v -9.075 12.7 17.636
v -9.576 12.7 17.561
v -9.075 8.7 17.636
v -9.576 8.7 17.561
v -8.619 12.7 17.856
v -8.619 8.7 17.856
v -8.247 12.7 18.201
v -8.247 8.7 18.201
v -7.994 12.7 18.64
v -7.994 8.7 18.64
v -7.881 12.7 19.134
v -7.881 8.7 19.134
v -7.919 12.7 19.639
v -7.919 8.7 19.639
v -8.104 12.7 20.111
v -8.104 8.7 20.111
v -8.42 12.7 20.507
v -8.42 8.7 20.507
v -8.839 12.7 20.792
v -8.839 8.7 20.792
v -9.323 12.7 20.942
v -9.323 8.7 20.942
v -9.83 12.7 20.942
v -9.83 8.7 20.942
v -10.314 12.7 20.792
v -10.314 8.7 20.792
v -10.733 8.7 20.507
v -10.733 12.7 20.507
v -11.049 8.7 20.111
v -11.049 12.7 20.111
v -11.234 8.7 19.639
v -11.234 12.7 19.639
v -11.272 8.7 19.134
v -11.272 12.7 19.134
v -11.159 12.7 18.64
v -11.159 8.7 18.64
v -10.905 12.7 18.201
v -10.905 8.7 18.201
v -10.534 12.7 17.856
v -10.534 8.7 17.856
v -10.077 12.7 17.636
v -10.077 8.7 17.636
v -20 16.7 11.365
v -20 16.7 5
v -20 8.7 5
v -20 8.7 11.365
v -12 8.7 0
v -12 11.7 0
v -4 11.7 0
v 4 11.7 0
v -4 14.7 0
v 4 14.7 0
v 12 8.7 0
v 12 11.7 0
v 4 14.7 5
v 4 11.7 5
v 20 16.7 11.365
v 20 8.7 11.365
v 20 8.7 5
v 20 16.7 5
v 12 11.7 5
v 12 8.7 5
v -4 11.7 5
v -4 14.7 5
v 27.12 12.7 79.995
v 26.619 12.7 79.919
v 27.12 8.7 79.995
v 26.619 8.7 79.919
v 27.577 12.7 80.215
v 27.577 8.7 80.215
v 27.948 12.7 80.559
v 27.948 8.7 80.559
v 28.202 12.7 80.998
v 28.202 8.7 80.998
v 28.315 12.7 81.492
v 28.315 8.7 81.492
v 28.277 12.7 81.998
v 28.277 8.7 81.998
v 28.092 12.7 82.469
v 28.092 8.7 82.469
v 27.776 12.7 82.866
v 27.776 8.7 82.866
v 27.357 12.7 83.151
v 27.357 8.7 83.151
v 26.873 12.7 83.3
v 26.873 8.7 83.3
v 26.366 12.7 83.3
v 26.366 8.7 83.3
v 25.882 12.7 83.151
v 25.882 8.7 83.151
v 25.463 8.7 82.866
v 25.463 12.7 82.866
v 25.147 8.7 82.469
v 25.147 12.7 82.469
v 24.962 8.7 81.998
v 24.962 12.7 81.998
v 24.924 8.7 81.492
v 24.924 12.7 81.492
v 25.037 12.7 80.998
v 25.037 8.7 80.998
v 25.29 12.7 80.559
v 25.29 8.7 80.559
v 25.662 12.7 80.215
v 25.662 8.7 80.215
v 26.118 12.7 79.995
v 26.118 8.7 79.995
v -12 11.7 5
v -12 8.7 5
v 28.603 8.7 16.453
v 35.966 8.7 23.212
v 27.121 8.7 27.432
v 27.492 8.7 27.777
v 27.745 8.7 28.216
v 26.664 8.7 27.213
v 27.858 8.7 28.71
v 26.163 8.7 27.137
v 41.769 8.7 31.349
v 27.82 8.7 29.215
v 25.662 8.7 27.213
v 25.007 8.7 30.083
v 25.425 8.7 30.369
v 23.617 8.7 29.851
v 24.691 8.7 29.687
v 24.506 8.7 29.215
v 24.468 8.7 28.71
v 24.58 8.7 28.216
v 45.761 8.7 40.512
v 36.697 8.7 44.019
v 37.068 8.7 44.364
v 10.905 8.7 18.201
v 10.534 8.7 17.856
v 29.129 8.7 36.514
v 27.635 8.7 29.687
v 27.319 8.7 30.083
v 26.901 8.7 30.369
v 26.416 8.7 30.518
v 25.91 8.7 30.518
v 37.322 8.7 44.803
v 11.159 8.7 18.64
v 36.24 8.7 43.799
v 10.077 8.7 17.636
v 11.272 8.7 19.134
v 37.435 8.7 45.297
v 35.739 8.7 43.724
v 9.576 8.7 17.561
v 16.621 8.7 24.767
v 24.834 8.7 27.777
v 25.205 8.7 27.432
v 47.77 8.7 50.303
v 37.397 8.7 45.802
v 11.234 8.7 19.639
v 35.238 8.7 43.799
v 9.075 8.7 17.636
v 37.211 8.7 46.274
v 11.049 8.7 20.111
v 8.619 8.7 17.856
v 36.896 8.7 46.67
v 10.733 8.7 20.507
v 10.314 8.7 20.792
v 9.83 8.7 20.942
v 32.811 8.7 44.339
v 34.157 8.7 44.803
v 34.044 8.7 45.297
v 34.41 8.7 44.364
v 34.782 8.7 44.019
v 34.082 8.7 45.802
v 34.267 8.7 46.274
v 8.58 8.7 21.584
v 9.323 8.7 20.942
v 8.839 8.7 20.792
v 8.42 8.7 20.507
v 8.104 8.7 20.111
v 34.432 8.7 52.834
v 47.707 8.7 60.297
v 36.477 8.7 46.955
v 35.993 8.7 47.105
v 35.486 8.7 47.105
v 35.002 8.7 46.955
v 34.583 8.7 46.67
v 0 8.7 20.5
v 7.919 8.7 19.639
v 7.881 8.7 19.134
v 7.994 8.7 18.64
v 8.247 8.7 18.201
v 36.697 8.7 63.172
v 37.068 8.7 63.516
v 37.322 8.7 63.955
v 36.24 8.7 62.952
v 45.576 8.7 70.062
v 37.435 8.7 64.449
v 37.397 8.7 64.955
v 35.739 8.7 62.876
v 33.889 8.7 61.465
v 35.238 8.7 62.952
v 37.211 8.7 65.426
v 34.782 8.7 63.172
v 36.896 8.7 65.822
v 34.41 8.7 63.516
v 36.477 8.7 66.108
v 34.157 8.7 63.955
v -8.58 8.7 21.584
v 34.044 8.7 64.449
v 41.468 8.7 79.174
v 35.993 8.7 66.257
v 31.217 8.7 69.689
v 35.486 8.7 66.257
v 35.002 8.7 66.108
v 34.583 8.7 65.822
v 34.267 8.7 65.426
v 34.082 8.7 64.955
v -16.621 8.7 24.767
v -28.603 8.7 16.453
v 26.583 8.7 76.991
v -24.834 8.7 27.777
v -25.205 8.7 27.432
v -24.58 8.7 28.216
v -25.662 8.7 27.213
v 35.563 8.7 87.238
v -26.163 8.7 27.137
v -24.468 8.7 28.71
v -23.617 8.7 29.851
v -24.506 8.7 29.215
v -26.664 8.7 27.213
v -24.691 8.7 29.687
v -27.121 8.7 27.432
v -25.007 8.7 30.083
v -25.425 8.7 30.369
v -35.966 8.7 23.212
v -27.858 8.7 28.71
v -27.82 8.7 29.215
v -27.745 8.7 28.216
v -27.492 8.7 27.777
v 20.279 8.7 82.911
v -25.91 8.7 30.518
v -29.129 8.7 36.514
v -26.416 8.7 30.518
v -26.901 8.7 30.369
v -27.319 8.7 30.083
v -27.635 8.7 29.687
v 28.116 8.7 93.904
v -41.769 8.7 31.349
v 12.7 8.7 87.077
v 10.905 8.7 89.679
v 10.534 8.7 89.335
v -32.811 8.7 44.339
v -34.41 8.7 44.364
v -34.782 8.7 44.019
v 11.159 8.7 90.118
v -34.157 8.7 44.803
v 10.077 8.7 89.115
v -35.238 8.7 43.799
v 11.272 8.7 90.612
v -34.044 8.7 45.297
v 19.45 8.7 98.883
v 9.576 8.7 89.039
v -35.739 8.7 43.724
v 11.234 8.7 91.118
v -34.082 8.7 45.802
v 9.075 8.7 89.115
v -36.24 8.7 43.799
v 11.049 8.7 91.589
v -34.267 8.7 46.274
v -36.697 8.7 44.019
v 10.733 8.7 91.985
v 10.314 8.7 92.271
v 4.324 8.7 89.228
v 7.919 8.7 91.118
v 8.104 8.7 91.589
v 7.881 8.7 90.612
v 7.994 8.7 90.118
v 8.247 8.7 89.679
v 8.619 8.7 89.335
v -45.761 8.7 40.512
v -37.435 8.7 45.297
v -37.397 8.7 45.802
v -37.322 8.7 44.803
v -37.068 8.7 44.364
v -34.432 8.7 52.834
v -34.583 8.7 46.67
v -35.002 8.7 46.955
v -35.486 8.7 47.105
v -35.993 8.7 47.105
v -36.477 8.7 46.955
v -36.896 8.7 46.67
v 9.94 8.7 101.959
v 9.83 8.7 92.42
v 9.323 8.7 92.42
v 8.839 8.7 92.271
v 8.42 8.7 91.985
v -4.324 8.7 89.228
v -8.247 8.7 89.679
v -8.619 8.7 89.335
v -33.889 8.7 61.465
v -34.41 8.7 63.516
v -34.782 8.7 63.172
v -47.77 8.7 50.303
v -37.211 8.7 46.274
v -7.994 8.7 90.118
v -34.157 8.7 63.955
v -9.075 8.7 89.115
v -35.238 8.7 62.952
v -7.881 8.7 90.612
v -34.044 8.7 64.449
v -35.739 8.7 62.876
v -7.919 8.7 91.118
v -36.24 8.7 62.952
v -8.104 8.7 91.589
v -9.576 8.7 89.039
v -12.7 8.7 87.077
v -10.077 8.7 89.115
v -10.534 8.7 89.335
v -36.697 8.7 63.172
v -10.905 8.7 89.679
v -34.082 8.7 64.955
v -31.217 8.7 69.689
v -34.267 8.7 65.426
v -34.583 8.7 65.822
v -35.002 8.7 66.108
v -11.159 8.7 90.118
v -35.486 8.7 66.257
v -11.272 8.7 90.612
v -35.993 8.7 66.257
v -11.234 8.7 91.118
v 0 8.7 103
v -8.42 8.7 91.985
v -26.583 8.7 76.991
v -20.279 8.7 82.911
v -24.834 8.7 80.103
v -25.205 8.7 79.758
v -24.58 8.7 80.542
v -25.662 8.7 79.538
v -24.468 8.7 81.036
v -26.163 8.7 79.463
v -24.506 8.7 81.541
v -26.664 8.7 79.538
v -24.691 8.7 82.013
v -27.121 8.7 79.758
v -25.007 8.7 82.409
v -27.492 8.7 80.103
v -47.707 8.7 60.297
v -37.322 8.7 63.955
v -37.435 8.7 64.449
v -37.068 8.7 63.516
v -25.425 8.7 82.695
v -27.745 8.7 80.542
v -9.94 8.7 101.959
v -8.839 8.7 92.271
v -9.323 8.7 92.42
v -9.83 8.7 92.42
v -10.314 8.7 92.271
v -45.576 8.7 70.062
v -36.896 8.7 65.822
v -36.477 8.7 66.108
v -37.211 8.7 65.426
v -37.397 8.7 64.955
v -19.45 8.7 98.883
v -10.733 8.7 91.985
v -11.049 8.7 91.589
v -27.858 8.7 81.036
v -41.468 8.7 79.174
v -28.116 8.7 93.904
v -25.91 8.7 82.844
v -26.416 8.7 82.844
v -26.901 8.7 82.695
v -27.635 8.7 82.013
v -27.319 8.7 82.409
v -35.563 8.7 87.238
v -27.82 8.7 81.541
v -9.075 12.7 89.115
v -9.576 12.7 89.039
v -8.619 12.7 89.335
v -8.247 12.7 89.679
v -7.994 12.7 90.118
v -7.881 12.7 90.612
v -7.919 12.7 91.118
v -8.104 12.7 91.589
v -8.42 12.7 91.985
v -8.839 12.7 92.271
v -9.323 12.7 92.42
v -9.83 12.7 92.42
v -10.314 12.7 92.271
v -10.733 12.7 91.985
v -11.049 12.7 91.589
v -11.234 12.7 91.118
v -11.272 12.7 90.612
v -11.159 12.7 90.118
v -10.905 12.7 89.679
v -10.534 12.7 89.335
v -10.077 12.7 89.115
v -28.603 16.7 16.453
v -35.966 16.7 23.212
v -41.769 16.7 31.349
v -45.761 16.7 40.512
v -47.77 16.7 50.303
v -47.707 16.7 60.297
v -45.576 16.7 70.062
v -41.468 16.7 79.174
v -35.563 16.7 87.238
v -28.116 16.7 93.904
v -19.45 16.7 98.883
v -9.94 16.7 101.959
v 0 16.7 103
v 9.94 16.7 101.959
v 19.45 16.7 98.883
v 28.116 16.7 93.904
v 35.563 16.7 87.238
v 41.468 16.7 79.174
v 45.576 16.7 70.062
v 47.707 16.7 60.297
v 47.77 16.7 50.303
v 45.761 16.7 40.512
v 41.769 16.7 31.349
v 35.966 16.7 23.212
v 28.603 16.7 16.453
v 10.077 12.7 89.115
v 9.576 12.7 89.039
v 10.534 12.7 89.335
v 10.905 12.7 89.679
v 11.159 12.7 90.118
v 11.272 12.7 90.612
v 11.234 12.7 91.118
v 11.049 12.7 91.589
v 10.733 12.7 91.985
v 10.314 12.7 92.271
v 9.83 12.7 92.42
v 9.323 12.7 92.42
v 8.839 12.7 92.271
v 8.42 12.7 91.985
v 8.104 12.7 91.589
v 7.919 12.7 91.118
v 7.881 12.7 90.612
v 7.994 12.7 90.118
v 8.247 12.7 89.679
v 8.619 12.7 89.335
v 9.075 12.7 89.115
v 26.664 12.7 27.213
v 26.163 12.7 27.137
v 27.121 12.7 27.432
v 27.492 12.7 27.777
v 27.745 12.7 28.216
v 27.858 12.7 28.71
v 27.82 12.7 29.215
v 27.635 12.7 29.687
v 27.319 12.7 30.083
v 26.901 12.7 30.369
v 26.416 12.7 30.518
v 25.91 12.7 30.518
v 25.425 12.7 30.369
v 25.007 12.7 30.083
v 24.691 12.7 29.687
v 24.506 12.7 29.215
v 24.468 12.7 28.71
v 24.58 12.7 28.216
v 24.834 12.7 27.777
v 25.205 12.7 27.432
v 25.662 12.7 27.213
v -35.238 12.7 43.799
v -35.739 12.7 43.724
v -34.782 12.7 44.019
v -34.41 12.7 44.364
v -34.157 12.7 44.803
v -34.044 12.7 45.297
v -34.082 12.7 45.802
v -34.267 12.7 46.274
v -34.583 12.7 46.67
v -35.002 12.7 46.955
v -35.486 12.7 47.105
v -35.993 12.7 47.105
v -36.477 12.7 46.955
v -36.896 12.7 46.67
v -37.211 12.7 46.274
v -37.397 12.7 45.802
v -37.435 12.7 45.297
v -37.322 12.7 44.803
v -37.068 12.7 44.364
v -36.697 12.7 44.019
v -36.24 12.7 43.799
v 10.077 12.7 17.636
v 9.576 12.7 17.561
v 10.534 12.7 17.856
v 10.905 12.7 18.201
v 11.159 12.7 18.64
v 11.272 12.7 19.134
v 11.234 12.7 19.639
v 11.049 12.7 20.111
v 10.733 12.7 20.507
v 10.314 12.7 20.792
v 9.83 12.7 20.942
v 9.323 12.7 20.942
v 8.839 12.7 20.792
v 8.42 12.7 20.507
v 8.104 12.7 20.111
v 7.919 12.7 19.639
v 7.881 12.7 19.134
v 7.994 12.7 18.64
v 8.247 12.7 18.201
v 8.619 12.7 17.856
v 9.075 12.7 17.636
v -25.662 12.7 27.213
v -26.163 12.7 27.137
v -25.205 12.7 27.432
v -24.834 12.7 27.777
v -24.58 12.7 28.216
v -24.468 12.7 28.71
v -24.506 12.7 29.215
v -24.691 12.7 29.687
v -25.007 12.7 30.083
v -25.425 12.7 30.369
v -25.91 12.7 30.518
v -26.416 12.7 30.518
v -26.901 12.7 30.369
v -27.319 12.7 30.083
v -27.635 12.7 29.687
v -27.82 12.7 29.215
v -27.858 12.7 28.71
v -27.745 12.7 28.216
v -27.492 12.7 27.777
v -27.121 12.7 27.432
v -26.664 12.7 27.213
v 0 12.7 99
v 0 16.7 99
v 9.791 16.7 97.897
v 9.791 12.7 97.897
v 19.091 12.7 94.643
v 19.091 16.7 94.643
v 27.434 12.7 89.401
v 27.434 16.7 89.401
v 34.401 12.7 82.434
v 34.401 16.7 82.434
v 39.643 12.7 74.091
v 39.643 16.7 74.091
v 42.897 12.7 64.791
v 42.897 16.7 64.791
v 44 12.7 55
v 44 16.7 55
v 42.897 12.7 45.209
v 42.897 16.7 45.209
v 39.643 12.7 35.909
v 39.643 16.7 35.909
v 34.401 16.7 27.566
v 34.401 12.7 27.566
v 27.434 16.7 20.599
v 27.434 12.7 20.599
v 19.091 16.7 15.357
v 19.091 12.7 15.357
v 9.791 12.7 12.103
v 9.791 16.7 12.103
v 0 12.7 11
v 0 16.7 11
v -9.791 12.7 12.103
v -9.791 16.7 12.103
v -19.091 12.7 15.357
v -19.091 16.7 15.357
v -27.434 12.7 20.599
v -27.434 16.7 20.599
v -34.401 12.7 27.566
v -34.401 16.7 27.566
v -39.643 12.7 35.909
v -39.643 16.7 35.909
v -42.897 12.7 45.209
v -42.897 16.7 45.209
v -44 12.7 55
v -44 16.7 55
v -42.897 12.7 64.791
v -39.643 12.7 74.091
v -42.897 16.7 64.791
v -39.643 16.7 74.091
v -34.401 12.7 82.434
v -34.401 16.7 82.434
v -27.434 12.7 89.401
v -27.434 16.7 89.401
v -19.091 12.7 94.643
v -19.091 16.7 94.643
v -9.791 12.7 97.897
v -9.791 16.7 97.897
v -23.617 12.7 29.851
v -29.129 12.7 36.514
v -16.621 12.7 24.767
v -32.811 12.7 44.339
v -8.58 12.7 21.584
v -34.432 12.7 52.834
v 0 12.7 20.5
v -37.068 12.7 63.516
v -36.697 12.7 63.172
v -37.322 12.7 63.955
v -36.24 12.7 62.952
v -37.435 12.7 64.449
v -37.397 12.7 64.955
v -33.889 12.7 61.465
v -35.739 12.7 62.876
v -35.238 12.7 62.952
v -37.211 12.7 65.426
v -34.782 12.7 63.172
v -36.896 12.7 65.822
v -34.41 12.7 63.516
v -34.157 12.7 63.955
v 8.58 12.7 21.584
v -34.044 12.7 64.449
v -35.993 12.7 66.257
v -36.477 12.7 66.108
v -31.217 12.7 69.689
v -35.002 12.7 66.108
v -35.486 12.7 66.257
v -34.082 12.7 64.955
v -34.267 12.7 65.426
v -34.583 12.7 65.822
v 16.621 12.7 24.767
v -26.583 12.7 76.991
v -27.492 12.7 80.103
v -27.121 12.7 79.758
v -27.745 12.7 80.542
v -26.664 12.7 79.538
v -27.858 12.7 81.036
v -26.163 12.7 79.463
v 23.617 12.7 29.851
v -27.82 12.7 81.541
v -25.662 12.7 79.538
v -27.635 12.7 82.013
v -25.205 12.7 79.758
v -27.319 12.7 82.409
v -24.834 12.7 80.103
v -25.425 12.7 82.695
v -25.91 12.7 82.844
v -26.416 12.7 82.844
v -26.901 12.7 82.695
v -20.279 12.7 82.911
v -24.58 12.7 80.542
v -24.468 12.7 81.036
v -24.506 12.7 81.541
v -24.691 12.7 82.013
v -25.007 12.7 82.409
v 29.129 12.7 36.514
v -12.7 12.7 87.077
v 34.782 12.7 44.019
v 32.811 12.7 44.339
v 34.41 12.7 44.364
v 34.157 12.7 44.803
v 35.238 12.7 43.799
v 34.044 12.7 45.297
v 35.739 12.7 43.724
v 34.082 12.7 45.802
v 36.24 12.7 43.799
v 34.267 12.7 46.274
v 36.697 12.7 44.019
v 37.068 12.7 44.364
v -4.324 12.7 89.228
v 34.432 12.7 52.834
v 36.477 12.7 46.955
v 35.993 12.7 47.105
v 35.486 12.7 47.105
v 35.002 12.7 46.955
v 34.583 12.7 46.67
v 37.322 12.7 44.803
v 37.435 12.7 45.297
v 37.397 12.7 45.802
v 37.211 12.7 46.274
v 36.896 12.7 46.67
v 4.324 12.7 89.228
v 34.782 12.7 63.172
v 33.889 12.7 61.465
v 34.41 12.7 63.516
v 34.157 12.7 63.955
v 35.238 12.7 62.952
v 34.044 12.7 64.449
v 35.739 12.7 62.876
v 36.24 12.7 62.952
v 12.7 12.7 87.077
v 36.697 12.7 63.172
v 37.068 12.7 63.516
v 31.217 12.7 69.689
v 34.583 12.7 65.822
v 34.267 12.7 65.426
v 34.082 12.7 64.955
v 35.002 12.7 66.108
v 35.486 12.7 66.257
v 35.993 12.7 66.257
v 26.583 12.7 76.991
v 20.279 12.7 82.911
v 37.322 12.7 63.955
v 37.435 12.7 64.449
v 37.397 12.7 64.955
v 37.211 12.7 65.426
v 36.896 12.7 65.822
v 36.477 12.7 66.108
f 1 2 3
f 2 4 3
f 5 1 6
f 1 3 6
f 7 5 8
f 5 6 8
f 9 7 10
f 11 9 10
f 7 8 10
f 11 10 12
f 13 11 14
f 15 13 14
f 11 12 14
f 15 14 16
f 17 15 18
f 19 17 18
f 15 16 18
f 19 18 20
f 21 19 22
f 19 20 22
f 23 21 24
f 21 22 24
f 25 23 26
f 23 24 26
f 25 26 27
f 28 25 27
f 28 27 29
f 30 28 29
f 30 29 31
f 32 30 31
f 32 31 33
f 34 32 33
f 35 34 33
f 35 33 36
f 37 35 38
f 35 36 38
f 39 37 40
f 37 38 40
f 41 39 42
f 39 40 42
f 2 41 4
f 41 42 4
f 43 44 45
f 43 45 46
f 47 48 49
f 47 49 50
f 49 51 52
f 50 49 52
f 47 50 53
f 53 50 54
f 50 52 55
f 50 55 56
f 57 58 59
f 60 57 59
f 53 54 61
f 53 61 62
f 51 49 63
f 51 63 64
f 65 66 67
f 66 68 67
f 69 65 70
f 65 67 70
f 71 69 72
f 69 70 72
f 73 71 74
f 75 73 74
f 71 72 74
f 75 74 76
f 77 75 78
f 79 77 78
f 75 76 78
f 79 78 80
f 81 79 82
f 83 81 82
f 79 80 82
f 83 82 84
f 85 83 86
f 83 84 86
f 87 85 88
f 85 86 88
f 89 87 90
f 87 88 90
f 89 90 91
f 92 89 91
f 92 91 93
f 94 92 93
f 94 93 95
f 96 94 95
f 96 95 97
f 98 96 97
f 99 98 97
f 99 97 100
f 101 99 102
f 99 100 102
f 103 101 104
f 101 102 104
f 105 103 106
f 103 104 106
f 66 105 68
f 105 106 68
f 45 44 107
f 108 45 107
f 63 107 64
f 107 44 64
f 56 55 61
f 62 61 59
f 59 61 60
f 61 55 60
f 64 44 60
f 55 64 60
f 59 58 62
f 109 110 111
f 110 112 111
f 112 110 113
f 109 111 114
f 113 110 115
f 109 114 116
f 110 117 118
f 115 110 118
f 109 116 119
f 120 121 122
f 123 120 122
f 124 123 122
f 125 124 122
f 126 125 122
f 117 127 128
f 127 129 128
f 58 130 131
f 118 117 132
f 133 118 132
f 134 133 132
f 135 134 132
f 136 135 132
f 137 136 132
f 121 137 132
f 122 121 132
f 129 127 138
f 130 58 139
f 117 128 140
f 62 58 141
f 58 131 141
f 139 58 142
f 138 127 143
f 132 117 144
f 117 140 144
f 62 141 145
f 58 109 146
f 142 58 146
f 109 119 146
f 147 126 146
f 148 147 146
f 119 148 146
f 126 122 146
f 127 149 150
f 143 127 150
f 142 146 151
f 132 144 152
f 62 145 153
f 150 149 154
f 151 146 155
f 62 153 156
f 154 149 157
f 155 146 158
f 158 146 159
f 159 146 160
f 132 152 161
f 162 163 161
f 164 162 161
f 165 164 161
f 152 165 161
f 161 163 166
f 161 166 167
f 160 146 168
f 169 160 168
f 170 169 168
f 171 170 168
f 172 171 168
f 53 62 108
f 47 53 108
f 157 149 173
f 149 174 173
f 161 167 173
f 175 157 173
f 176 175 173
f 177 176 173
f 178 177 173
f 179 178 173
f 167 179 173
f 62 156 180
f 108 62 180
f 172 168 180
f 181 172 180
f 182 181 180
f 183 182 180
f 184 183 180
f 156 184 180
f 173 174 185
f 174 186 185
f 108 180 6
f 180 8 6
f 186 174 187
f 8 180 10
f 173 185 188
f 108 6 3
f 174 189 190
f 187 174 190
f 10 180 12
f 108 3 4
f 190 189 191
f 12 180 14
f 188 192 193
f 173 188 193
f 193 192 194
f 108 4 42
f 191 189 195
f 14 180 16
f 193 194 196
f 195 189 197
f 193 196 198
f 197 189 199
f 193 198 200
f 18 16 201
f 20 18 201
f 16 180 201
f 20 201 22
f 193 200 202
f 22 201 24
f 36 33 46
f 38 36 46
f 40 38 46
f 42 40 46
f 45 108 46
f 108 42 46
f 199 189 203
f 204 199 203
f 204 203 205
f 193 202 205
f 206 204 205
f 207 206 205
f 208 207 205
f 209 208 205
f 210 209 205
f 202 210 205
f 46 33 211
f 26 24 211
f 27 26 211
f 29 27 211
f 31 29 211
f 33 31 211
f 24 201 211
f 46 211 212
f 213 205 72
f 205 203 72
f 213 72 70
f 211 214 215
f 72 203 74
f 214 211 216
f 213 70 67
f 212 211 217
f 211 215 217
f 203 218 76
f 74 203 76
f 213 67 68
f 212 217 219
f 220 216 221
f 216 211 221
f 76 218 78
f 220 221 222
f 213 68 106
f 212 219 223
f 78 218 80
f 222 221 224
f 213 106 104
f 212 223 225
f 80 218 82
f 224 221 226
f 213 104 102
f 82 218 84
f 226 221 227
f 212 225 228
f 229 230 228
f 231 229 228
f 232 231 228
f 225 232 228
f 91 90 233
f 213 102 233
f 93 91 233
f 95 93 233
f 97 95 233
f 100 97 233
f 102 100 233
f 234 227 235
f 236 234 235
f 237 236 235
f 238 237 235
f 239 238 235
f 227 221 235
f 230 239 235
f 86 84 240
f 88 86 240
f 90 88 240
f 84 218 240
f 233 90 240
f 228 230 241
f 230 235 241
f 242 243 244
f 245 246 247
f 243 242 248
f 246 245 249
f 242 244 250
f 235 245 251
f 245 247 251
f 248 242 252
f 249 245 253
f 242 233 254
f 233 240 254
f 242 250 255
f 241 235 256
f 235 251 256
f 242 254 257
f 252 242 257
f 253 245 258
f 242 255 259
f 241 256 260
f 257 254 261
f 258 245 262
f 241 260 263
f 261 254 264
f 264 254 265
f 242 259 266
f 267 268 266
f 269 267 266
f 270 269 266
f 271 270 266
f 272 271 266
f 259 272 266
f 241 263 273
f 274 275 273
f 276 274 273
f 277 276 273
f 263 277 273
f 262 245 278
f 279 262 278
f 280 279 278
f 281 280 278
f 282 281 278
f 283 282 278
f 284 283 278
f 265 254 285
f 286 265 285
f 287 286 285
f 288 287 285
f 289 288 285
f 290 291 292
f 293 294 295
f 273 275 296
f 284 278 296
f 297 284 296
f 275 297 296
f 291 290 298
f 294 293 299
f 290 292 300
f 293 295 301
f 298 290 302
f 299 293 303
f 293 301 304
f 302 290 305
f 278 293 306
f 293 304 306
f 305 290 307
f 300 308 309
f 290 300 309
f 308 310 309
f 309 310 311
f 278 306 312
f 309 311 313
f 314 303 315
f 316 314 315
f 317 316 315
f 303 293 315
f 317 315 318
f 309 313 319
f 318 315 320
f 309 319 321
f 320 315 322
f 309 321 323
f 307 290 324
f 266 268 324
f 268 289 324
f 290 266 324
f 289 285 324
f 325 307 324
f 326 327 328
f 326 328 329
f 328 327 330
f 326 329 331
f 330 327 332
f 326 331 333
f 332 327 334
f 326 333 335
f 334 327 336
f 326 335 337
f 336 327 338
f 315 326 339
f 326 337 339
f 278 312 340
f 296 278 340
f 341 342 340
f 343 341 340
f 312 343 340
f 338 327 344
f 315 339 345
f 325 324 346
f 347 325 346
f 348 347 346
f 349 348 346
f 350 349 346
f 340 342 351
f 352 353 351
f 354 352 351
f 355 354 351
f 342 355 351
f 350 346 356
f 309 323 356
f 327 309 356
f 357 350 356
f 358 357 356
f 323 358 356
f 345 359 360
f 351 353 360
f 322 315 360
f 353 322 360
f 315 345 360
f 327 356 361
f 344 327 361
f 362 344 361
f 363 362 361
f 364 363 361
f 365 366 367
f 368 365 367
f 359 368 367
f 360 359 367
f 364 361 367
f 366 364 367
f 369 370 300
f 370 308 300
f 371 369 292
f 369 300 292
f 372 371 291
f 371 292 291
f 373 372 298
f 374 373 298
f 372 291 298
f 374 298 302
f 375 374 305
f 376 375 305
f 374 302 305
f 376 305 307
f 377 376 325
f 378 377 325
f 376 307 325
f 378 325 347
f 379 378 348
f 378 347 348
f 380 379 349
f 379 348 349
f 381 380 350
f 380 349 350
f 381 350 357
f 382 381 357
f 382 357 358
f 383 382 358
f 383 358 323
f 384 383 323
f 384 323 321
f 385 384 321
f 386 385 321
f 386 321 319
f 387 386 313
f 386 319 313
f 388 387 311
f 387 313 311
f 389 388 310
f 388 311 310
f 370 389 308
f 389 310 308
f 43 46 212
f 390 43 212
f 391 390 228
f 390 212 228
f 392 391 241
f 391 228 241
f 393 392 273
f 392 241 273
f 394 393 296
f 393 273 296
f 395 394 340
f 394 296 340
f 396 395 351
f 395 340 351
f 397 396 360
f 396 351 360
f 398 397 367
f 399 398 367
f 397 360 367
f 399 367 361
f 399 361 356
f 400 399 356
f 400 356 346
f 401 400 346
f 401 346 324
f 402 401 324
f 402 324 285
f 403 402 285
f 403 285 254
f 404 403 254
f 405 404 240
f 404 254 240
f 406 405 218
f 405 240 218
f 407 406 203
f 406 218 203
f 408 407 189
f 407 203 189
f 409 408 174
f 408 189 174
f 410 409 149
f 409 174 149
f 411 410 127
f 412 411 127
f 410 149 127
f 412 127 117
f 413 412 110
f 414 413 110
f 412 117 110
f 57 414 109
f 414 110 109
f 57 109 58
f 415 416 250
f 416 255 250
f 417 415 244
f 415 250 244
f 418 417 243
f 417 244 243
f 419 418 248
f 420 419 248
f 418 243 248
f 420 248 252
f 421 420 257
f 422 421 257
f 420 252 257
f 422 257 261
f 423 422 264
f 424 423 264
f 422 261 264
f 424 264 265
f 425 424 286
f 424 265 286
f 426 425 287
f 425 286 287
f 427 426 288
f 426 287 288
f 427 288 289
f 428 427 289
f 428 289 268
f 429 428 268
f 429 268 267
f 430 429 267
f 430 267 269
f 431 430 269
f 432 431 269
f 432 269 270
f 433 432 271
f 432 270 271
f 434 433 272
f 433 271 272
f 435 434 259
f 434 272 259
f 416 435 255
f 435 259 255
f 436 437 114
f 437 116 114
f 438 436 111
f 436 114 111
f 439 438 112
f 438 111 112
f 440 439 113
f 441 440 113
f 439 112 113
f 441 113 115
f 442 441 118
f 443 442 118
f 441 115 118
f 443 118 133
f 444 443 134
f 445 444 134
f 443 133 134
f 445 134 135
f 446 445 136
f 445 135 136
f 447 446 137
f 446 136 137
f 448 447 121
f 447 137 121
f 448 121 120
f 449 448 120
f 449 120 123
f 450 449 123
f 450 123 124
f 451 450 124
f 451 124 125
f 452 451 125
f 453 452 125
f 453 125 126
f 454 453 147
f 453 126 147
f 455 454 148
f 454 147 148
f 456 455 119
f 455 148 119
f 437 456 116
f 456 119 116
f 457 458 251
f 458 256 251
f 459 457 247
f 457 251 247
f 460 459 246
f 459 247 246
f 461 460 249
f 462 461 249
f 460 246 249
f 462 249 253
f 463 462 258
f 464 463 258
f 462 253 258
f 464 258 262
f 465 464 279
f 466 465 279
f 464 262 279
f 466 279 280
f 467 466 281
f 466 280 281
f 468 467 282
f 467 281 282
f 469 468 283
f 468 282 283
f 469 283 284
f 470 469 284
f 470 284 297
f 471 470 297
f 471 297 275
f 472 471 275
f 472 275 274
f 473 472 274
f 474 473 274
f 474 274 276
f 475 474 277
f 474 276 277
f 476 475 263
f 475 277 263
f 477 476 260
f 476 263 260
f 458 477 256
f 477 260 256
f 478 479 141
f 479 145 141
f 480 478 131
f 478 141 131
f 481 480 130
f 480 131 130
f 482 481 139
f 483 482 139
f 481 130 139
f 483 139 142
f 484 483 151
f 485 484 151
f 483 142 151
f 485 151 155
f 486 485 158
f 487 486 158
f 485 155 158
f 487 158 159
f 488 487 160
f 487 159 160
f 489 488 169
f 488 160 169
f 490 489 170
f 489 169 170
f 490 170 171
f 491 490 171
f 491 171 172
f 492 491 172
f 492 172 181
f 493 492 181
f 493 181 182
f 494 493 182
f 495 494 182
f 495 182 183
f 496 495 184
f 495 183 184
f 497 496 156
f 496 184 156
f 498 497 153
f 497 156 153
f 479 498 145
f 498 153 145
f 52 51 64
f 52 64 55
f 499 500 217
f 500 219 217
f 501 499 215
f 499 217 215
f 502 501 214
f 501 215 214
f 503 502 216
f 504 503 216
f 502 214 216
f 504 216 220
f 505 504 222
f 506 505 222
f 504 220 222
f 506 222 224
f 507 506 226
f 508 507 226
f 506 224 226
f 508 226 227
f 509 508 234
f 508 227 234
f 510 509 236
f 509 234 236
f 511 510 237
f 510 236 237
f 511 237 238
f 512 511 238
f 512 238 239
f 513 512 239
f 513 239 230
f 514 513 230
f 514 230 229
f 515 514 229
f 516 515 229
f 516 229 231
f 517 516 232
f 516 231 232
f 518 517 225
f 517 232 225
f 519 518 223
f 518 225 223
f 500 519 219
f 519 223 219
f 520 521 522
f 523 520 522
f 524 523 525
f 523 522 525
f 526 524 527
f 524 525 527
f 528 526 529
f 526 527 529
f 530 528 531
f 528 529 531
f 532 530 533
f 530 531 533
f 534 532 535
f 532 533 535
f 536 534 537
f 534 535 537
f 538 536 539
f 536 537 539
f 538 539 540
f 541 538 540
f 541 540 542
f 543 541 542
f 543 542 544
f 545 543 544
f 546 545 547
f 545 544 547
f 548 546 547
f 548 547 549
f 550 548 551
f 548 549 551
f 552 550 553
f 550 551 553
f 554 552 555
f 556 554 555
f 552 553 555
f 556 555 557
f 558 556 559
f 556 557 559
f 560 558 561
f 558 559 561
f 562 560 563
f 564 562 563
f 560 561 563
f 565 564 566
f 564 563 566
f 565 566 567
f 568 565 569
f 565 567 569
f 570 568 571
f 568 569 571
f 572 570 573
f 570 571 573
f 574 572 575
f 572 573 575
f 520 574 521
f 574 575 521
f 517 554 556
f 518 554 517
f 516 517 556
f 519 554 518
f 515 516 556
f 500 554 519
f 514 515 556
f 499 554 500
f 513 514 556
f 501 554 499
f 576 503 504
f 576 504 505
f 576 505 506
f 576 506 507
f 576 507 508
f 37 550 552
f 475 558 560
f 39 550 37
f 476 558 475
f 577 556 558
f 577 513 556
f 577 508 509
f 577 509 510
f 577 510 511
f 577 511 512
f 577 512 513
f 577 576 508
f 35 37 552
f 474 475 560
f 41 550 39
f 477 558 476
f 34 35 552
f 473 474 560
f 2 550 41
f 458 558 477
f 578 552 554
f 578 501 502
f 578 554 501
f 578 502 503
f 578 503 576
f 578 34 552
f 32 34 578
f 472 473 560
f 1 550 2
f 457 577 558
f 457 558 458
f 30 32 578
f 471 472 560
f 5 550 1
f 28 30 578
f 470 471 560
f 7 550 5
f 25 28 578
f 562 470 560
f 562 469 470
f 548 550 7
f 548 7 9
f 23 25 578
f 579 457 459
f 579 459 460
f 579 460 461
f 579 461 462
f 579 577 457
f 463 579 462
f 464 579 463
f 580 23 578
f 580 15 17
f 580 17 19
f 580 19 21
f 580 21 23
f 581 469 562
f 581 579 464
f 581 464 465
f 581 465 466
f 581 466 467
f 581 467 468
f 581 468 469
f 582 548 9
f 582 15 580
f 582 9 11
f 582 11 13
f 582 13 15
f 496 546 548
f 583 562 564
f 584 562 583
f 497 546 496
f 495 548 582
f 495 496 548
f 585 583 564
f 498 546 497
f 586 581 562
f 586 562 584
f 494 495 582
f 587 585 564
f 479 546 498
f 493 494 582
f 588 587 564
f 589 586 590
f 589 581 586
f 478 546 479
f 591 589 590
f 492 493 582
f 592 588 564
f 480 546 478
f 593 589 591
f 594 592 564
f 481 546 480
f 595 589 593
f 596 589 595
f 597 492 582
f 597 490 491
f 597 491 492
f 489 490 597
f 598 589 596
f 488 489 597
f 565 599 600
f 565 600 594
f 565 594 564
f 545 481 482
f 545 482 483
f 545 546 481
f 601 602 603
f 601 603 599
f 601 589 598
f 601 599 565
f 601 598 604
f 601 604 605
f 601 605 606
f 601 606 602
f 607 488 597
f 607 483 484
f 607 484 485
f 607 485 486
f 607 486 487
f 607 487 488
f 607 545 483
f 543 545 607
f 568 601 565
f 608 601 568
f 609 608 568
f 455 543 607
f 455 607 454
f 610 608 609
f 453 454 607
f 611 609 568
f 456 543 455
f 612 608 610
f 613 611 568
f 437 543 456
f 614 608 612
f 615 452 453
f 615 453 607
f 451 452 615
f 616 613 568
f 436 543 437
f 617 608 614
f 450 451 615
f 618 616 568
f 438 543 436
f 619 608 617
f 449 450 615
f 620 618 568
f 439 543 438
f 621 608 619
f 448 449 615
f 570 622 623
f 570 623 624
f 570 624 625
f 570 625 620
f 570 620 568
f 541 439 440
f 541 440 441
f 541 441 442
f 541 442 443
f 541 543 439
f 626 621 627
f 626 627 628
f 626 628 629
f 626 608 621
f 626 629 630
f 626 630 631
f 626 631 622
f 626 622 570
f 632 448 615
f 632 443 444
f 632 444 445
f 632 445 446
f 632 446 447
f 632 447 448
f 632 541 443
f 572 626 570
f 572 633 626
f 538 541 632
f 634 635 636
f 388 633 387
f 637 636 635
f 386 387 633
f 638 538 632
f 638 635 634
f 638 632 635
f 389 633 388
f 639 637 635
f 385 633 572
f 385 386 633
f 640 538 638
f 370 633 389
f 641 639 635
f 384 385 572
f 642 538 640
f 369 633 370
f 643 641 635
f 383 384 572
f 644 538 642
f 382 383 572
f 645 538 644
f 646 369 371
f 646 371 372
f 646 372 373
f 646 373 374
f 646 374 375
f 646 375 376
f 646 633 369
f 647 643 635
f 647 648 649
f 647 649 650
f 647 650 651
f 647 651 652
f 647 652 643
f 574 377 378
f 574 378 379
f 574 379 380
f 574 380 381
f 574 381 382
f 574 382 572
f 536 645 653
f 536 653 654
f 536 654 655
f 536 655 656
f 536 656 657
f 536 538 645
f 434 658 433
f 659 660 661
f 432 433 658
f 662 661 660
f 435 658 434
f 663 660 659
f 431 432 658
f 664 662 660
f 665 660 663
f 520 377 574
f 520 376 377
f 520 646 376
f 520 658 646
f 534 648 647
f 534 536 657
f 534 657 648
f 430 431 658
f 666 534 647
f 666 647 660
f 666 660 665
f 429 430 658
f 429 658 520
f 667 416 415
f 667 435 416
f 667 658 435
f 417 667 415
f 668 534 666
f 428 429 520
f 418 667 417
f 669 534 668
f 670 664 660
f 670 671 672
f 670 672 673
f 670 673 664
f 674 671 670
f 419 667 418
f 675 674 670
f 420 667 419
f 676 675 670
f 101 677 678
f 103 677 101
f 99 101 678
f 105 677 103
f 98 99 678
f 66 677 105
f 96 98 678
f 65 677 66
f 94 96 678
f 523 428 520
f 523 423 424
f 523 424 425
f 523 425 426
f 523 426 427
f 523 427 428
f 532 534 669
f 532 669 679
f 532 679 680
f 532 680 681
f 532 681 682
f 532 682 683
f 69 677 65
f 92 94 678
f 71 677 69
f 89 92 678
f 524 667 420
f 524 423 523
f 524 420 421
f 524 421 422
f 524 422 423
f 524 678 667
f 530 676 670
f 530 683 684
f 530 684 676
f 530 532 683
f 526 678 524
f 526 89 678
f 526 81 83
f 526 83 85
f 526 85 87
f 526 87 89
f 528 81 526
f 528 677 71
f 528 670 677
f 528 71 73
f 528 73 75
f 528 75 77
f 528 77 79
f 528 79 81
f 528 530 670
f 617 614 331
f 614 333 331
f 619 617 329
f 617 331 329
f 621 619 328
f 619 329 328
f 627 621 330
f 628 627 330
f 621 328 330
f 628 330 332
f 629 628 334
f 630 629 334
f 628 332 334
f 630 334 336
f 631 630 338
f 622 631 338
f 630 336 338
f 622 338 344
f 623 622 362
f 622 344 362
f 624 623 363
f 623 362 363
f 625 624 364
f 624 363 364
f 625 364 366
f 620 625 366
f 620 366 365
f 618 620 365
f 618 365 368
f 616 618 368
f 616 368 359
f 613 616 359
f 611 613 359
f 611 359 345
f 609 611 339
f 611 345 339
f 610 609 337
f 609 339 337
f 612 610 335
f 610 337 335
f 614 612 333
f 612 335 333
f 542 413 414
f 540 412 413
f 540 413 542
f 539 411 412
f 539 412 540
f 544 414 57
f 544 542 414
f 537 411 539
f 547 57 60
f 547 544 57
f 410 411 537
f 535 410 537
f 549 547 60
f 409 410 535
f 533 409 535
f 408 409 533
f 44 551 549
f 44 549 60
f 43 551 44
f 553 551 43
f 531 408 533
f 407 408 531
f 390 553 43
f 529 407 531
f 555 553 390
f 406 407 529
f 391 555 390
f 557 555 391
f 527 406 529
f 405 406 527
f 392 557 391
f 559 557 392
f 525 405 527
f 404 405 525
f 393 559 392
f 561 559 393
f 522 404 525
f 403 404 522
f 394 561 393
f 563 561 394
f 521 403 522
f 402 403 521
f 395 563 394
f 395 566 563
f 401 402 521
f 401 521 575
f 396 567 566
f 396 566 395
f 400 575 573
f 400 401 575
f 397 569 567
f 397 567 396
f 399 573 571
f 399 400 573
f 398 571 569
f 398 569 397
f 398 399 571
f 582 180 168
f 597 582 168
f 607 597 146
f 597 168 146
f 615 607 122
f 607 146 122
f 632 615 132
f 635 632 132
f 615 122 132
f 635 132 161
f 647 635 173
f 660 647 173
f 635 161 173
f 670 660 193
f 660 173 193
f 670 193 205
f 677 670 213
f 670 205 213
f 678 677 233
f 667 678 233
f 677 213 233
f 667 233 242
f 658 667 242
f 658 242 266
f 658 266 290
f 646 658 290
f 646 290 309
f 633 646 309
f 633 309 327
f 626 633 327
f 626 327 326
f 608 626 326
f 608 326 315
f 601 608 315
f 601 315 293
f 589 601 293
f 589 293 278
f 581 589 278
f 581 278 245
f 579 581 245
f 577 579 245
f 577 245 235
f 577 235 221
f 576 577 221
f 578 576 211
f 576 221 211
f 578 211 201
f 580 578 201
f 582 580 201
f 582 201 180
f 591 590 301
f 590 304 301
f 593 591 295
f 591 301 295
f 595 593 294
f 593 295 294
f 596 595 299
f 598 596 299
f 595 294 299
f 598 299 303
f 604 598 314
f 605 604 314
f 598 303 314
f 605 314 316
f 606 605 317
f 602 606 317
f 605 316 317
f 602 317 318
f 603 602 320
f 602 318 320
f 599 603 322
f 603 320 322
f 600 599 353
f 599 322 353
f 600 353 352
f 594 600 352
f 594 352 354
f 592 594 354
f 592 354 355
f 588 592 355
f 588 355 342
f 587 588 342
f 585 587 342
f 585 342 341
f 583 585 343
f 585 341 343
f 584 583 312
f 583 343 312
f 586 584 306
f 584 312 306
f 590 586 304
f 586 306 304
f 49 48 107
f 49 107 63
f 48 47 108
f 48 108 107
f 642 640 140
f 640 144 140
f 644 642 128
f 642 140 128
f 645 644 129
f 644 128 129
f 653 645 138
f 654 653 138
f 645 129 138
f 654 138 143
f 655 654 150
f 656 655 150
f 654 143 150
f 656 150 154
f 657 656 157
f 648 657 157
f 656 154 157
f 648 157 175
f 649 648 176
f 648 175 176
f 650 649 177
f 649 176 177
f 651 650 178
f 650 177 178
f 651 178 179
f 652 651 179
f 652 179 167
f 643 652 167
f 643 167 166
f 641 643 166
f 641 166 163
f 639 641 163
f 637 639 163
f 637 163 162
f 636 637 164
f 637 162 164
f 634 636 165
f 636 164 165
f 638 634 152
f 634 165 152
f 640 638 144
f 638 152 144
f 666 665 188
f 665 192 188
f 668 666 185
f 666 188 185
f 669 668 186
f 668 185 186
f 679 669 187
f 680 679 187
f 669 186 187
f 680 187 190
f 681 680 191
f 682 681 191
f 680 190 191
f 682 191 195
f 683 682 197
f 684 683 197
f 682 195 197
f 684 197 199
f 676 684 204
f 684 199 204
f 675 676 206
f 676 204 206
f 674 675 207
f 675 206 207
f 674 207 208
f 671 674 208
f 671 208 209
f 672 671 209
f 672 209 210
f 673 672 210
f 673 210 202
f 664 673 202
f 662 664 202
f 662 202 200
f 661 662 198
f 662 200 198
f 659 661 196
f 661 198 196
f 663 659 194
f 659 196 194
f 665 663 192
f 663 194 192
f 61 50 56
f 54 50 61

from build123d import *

# Parameters (mm, degrees)
SKETCH_1_R                   = 26.5
EXTRUDE_1_DEPTH              = 5
HOLE_WIZARD_M4_1_AT_2_COUNT  = 2
HOLE_WIZARD_M4_1_AT_2_PITCH  = 39.424388736
HOLE_WIZARD_M4_1_AT_3_COUNT  = 2
HOLE_WIZARD_M4_1_AT_3_PITCH  = 39.424388736
HOLE_WIZARD_M4_1_AT_4_COUNT  = 2
HOLE_WIZARD_M4_1_AT_4_PITCH  = 18.383894388
HOLE_WIZARD_M4_1_AT_5_COUNT  = 2
HOLE_WIZARD_M4_1_AT_5_PITCH  = 43.5
HOLE_WIZARD_M4_1_AT_6_COUNT  = 2
HOLE_WIZARD_M4_1_AT_6_PITCH  = 39.424388736
HOLE_WIZARD_M4_1_AT_7_COUNT  = 2
HOLE_WIZARD_M4_1_AT_7_PITCH  = 18.383894388
EXTRUDE_1604_DEPTH           = 8
SKETCH_8_R                   = 34.5
CUT_EXTRUDE_1696_DEPTH       = 119.962346984
HOLE_WIZARD_M3_1_D           = 3.4
HOLE_WIZARD_M3_1_CBORE_D     = 6.5
HOLE_WIZARD_M3_1_CBORE_DEPTH = 3
SKETCH_11_R                  = 26.5
CUT_EXTRUDE_1_DEPTH          = 5
SKETCH_12_R                  = 44
CUT_EXTRUDE_6_DEPTH          = 4


with BuildPart() as part:
    # 草图1 → 凸台-拉伸1 (new body)
    with BuildSketch(Plane.XY):
        Circle(SKETCH_1_R)
    extrude(amount=EXTRUDE_1_DEPTH)

    # 草图3 → M4 六角凹头盖的柱孔1 (revolve, cut)
    with BuildSketch(Plane(origin=(21.75, 0, 5), x_dir=(0, -1, 0), z_dir=(1, 0, 0))):
        Polygon((0, 0), (0, 5), (2.25, 5), (2.25, 4), (4, 4), (4, 0), align=None)
    hole_wizard_m4_1 = revolve(axis=Axis((21.75, 0, 11.35), (0, 0, -1)), mode=Mode.SUBTRACT)

    # M4 六角凹头盖的柱孔1 at 2: M4 六角凹头盖的柱孔1 ×2
    with Locations(*[Vector(-0.9063077870366496, 0.4226182617407002, 0) * (i * HOLE_WIZARD_M4_1_AT_2_PITCH) for i in range(1, HOLE_WIZARD_M4_1_AT_2_COUNT)]):
        add(hole_wizard_m4_1, mode=Mode.SUBTRACT)

    # M4 六角凹头盖的柱孔1 at 3: M4 六角凹头盖的柱孔1 ×2
    with Locations(*[Vector(-0.9063077870125524, 0.42261826179237694, 0) * (i * HOLE_WIZARD_M4_1_AT_3_PITCH) for i in range(1, HOLE_WIZARD_M4_1_AT_3_COUNT)]):
        add(hole_wizard_m4_1, mode=Mode.SUBTRACT)

    # M4 六角凹头盖的柱孔1 at 4: M4 六角凹头盖的柱孔1 ×2
    with Locations(*[Vector(-0.42261826172613215, 0.9063077870434428, 0) * (i * HOLE_WIZARD_M4_1_AT_4_PITCH) for i in range(1, HOLE_WIZARD_M4_1_AT_4_COUNT)]):
        add(hole_wizard_m4_1, mode=Mode.SUBTRACT)

    # M4 六角凹头盖的柱孔1 at 5: M4 六角凹头盖的柱孔1 ×2
    with Locations(*[(-i * HOLE_WIZARD_M4_1_AT_5_PITCH, 0, 0) for i in range(1, HOLE_WIZARD_M4_1_AT_5_COUNT)]):
        add(hole_wizard_m4_1, mode=Mode.SUBTRACT)

    # M4 六角凹头盖的柱孔1 at 6: M4 六角凹头盖的柱孔1 ×2
    with Locations(*[Vector(-0.9063077870125524, -0.42261826179237694, 0) * (i * HOLE_WIZARD_M4_1_AT_6_PITCH) for i in range(1, HOLE_WIZARD_M4_1_AT_6_COUNT)]):
        add(hole_wizard_m4_1, mode=Mode.SUBTRACT)

    # M4 六角凹头盖的柱孔1 at 7: M4 六角凹头盖的柱孔1 ×2
    with Locations(*[Vector(-0.42261826172613215, -0.9063077870434428, 0) * (i * HOLE_WIZARD_M4_1_AT_7_PITCH) for i in range(1, HOLE_WIZARD_M4_1_AT_7_COUNT)]):
        add(hole_wizard_m4_1, mode=Mode.SUBTRACT)

    # 草图5 → Extrude 1604 (add)
    with BuildSketch(Plane.XZ.offset(-8.7)):
        with BuildLine():
            Line((-20, 5), (-20, 11.365151541))
            ThreePointArc((-20, 11.365151541), (0, 103), (20, 11.365151541))
            Line((20, 11.365151541), (20, 5))
            Line((20, 5), (-20, 5))
        make_face()
    extrude(amount=-EXTRUDE_1604_DEPTH)

    # 草图8 → Cut-Extrude 1696 (cut, through all)
    with BuildSketch(Plane.XZ.offset(-8.7)):
        with Locations(Location((0, 55, 0), (0, 0, 270))):
            Circle(SKETCH_8_R)
    extrude(amount=-CUT_EXTRUDE_1696_DEPTH, mode=Mode.SUBTRACT)

    # M3 六角凹头盖的柱孔1 (through all)
    with Locations(Plane(origin=(-9.576304669, 16.7, 19.260744427), x_dir=(0, 0, 1), z_dir=(0, 1, 0))):
        with Locations((0, 0), (0, 19.152609338), (9.576304669, 35.739255573), (26.162950904, 45.315560242), (45.315560242, 45.315560242), (62.358629164, 36.19567826), (71.478511143, 19.152609339), (71.478511146, 0), (61.902206477, -16.586646235), (9.576304669, -16.586646235), (26.162950904, -26.162950904), (45.315560242, -26.162950904)):
            CounterBoreHole(HOLE_WIZARD_M3_1_D / 2, HOLE_WIZARD_M3_1_CBORE_D / 2, HOLE_WIZARD_M3_1_CBORE_DEPTH)

    # 草图11 → 切除-拉伸1 (cut)
    with BuildSketch(Plane.XY):
        Circle(SKETCH_11_R)
        Polygon((-4, 14.7), (4, 14.7), (4, 11.7), (12, 11.7), (12, 8.7), (-12, 8.7), (-12, 11.7), (-4, 11.7), align=None, mode=Mode.SUBTRACT)
    extrude(amount=CUT_EXTRUDE_1_DEPTH, mode=Mode.SUBTRACT)

    # 草图12 → 切除-拉伸6 (cut)
    with BuildSketch(Plane(origin=(0, 16.7, 0), x_dir=(1, 0, 0), z_dir=(0, 1, 0))):
        with Locations(Location((0, -55, 0), (0, 0, 270))):
            Circle(SKETCH_12_R)
    extrude(amount=-CUT_EXTRUDE_6_DEPTH, mode=Mode.SUBTRACT)


solid = part.part
